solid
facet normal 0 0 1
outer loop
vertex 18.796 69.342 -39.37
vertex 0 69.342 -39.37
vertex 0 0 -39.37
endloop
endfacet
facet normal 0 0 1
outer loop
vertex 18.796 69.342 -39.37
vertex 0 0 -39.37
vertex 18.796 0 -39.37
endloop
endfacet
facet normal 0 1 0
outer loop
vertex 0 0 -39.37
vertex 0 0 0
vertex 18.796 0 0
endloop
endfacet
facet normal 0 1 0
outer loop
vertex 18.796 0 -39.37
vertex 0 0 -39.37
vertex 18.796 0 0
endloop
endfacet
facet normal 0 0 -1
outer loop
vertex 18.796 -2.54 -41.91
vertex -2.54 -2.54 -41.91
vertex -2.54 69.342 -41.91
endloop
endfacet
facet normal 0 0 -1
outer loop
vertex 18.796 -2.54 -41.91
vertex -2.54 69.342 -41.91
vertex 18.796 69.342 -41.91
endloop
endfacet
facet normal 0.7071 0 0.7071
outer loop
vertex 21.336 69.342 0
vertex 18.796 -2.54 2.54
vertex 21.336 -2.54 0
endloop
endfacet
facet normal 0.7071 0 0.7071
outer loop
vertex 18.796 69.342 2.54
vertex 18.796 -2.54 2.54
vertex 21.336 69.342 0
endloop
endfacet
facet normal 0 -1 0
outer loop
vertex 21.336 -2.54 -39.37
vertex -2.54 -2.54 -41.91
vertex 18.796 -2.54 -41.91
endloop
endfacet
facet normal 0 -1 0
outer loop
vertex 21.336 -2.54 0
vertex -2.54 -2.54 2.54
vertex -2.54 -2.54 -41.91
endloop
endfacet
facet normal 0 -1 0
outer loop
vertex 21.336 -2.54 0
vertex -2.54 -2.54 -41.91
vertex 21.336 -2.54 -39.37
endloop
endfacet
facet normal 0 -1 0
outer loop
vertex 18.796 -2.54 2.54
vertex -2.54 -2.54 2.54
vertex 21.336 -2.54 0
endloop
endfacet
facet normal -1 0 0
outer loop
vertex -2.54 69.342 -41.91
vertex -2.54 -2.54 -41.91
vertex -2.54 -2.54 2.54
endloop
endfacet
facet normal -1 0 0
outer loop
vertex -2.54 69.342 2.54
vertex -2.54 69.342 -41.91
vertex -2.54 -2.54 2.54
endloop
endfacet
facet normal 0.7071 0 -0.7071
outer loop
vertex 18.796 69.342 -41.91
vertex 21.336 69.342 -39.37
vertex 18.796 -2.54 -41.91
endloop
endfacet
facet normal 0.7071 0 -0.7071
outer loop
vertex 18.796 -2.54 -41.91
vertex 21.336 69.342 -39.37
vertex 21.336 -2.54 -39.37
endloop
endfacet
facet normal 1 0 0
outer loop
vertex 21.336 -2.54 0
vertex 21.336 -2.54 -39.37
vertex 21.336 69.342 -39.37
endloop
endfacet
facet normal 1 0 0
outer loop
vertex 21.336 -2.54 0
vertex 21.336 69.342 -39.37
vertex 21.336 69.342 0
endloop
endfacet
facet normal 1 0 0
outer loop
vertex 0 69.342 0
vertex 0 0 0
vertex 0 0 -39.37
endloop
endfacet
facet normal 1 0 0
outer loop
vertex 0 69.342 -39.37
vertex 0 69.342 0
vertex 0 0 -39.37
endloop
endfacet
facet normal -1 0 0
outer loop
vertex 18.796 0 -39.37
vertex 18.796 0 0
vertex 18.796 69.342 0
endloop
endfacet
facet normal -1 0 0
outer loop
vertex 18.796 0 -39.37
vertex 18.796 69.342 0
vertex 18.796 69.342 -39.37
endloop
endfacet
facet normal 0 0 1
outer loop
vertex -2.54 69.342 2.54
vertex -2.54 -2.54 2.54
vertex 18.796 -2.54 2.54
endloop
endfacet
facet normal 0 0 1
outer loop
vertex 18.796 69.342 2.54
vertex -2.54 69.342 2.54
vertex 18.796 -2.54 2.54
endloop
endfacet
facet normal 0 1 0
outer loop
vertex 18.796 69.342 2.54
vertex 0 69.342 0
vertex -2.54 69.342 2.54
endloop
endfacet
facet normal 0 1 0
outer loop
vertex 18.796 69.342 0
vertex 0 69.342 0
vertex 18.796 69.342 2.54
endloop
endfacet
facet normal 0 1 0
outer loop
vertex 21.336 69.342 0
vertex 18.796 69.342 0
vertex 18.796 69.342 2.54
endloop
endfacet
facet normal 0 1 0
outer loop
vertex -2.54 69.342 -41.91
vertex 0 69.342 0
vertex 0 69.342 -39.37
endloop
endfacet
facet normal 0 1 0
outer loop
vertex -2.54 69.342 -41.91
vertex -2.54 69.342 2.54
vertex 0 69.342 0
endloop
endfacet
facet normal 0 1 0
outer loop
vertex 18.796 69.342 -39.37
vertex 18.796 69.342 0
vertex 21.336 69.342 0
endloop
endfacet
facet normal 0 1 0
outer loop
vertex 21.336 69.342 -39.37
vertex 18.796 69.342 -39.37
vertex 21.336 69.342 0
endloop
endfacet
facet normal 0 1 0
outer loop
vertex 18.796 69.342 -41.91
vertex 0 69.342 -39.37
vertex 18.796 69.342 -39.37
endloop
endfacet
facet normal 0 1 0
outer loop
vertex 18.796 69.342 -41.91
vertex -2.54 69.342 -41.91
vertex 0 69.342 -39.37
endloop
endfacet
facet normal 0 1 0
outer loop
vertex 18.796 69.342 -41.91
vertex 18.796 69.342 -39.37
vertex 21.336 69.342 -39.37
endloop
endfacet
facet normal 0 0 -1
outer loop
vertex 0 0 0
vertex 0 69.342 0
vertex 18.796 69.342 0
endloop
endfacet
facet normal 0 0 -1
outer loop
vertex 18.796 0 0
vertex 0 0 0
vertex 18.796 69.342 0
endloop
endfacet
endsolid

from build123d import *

# Parameters (mm, degrees)
SKETCH1_W           = 23.876
SKETCH1_H           = 44.45
SKETCH1_W_2         = 18.796
SKETCH1_H_2         = 39.37
BOSS_EXTRUDE1_DEPTH = 69.342
SKETCH2_W           = 23.876
SKETCH2_H           = 44.45
BOSS_EXTRUDE2_DEPTH = 2.54
CHAMFER1_SIZE       = 2.54


with BuildPart() as part:
    # Sketch1 → Boss-Extrude1 (new body)
    with BuildSketch(Plane(origin=(0, 0, 0), x_dir=(1, 0, 0), z_dir=(0, 1, 0))):
        with Locations((9.398, 19.685)):
            Rectangle(SKETCH1_W, SKETCH1_H)
        with Locations((9.398, 19.685)):
            Rectangle(SKETCH1_W_2, SKETCH1_H_2, mode=Mode.SUBTRACT)
    extrude(amount=BOSS_EXTRUDE1_DEPTH)

    # Sketch2 → Boss-Extrude2 (add)
    with BuildSketch(Plane.XZ):
        with Locations((9.398, -19.685)):
            Rectangle(SKETCH2_W, SKETCH2_H)
    extrude(amount=BOSS_EXTRUDE2_DEPTH)

    # Chamfer1
    chamfer1_edges = [part.edges().sort_by_distance(p)[0] for p in [
        (21.336, 33.401, -41.91),
        (21.336, 33.401, 2.54),
    ]]
    chamfer(chamfer1_edges, length=CHAMFER1_SIZE)


solid = part.part
